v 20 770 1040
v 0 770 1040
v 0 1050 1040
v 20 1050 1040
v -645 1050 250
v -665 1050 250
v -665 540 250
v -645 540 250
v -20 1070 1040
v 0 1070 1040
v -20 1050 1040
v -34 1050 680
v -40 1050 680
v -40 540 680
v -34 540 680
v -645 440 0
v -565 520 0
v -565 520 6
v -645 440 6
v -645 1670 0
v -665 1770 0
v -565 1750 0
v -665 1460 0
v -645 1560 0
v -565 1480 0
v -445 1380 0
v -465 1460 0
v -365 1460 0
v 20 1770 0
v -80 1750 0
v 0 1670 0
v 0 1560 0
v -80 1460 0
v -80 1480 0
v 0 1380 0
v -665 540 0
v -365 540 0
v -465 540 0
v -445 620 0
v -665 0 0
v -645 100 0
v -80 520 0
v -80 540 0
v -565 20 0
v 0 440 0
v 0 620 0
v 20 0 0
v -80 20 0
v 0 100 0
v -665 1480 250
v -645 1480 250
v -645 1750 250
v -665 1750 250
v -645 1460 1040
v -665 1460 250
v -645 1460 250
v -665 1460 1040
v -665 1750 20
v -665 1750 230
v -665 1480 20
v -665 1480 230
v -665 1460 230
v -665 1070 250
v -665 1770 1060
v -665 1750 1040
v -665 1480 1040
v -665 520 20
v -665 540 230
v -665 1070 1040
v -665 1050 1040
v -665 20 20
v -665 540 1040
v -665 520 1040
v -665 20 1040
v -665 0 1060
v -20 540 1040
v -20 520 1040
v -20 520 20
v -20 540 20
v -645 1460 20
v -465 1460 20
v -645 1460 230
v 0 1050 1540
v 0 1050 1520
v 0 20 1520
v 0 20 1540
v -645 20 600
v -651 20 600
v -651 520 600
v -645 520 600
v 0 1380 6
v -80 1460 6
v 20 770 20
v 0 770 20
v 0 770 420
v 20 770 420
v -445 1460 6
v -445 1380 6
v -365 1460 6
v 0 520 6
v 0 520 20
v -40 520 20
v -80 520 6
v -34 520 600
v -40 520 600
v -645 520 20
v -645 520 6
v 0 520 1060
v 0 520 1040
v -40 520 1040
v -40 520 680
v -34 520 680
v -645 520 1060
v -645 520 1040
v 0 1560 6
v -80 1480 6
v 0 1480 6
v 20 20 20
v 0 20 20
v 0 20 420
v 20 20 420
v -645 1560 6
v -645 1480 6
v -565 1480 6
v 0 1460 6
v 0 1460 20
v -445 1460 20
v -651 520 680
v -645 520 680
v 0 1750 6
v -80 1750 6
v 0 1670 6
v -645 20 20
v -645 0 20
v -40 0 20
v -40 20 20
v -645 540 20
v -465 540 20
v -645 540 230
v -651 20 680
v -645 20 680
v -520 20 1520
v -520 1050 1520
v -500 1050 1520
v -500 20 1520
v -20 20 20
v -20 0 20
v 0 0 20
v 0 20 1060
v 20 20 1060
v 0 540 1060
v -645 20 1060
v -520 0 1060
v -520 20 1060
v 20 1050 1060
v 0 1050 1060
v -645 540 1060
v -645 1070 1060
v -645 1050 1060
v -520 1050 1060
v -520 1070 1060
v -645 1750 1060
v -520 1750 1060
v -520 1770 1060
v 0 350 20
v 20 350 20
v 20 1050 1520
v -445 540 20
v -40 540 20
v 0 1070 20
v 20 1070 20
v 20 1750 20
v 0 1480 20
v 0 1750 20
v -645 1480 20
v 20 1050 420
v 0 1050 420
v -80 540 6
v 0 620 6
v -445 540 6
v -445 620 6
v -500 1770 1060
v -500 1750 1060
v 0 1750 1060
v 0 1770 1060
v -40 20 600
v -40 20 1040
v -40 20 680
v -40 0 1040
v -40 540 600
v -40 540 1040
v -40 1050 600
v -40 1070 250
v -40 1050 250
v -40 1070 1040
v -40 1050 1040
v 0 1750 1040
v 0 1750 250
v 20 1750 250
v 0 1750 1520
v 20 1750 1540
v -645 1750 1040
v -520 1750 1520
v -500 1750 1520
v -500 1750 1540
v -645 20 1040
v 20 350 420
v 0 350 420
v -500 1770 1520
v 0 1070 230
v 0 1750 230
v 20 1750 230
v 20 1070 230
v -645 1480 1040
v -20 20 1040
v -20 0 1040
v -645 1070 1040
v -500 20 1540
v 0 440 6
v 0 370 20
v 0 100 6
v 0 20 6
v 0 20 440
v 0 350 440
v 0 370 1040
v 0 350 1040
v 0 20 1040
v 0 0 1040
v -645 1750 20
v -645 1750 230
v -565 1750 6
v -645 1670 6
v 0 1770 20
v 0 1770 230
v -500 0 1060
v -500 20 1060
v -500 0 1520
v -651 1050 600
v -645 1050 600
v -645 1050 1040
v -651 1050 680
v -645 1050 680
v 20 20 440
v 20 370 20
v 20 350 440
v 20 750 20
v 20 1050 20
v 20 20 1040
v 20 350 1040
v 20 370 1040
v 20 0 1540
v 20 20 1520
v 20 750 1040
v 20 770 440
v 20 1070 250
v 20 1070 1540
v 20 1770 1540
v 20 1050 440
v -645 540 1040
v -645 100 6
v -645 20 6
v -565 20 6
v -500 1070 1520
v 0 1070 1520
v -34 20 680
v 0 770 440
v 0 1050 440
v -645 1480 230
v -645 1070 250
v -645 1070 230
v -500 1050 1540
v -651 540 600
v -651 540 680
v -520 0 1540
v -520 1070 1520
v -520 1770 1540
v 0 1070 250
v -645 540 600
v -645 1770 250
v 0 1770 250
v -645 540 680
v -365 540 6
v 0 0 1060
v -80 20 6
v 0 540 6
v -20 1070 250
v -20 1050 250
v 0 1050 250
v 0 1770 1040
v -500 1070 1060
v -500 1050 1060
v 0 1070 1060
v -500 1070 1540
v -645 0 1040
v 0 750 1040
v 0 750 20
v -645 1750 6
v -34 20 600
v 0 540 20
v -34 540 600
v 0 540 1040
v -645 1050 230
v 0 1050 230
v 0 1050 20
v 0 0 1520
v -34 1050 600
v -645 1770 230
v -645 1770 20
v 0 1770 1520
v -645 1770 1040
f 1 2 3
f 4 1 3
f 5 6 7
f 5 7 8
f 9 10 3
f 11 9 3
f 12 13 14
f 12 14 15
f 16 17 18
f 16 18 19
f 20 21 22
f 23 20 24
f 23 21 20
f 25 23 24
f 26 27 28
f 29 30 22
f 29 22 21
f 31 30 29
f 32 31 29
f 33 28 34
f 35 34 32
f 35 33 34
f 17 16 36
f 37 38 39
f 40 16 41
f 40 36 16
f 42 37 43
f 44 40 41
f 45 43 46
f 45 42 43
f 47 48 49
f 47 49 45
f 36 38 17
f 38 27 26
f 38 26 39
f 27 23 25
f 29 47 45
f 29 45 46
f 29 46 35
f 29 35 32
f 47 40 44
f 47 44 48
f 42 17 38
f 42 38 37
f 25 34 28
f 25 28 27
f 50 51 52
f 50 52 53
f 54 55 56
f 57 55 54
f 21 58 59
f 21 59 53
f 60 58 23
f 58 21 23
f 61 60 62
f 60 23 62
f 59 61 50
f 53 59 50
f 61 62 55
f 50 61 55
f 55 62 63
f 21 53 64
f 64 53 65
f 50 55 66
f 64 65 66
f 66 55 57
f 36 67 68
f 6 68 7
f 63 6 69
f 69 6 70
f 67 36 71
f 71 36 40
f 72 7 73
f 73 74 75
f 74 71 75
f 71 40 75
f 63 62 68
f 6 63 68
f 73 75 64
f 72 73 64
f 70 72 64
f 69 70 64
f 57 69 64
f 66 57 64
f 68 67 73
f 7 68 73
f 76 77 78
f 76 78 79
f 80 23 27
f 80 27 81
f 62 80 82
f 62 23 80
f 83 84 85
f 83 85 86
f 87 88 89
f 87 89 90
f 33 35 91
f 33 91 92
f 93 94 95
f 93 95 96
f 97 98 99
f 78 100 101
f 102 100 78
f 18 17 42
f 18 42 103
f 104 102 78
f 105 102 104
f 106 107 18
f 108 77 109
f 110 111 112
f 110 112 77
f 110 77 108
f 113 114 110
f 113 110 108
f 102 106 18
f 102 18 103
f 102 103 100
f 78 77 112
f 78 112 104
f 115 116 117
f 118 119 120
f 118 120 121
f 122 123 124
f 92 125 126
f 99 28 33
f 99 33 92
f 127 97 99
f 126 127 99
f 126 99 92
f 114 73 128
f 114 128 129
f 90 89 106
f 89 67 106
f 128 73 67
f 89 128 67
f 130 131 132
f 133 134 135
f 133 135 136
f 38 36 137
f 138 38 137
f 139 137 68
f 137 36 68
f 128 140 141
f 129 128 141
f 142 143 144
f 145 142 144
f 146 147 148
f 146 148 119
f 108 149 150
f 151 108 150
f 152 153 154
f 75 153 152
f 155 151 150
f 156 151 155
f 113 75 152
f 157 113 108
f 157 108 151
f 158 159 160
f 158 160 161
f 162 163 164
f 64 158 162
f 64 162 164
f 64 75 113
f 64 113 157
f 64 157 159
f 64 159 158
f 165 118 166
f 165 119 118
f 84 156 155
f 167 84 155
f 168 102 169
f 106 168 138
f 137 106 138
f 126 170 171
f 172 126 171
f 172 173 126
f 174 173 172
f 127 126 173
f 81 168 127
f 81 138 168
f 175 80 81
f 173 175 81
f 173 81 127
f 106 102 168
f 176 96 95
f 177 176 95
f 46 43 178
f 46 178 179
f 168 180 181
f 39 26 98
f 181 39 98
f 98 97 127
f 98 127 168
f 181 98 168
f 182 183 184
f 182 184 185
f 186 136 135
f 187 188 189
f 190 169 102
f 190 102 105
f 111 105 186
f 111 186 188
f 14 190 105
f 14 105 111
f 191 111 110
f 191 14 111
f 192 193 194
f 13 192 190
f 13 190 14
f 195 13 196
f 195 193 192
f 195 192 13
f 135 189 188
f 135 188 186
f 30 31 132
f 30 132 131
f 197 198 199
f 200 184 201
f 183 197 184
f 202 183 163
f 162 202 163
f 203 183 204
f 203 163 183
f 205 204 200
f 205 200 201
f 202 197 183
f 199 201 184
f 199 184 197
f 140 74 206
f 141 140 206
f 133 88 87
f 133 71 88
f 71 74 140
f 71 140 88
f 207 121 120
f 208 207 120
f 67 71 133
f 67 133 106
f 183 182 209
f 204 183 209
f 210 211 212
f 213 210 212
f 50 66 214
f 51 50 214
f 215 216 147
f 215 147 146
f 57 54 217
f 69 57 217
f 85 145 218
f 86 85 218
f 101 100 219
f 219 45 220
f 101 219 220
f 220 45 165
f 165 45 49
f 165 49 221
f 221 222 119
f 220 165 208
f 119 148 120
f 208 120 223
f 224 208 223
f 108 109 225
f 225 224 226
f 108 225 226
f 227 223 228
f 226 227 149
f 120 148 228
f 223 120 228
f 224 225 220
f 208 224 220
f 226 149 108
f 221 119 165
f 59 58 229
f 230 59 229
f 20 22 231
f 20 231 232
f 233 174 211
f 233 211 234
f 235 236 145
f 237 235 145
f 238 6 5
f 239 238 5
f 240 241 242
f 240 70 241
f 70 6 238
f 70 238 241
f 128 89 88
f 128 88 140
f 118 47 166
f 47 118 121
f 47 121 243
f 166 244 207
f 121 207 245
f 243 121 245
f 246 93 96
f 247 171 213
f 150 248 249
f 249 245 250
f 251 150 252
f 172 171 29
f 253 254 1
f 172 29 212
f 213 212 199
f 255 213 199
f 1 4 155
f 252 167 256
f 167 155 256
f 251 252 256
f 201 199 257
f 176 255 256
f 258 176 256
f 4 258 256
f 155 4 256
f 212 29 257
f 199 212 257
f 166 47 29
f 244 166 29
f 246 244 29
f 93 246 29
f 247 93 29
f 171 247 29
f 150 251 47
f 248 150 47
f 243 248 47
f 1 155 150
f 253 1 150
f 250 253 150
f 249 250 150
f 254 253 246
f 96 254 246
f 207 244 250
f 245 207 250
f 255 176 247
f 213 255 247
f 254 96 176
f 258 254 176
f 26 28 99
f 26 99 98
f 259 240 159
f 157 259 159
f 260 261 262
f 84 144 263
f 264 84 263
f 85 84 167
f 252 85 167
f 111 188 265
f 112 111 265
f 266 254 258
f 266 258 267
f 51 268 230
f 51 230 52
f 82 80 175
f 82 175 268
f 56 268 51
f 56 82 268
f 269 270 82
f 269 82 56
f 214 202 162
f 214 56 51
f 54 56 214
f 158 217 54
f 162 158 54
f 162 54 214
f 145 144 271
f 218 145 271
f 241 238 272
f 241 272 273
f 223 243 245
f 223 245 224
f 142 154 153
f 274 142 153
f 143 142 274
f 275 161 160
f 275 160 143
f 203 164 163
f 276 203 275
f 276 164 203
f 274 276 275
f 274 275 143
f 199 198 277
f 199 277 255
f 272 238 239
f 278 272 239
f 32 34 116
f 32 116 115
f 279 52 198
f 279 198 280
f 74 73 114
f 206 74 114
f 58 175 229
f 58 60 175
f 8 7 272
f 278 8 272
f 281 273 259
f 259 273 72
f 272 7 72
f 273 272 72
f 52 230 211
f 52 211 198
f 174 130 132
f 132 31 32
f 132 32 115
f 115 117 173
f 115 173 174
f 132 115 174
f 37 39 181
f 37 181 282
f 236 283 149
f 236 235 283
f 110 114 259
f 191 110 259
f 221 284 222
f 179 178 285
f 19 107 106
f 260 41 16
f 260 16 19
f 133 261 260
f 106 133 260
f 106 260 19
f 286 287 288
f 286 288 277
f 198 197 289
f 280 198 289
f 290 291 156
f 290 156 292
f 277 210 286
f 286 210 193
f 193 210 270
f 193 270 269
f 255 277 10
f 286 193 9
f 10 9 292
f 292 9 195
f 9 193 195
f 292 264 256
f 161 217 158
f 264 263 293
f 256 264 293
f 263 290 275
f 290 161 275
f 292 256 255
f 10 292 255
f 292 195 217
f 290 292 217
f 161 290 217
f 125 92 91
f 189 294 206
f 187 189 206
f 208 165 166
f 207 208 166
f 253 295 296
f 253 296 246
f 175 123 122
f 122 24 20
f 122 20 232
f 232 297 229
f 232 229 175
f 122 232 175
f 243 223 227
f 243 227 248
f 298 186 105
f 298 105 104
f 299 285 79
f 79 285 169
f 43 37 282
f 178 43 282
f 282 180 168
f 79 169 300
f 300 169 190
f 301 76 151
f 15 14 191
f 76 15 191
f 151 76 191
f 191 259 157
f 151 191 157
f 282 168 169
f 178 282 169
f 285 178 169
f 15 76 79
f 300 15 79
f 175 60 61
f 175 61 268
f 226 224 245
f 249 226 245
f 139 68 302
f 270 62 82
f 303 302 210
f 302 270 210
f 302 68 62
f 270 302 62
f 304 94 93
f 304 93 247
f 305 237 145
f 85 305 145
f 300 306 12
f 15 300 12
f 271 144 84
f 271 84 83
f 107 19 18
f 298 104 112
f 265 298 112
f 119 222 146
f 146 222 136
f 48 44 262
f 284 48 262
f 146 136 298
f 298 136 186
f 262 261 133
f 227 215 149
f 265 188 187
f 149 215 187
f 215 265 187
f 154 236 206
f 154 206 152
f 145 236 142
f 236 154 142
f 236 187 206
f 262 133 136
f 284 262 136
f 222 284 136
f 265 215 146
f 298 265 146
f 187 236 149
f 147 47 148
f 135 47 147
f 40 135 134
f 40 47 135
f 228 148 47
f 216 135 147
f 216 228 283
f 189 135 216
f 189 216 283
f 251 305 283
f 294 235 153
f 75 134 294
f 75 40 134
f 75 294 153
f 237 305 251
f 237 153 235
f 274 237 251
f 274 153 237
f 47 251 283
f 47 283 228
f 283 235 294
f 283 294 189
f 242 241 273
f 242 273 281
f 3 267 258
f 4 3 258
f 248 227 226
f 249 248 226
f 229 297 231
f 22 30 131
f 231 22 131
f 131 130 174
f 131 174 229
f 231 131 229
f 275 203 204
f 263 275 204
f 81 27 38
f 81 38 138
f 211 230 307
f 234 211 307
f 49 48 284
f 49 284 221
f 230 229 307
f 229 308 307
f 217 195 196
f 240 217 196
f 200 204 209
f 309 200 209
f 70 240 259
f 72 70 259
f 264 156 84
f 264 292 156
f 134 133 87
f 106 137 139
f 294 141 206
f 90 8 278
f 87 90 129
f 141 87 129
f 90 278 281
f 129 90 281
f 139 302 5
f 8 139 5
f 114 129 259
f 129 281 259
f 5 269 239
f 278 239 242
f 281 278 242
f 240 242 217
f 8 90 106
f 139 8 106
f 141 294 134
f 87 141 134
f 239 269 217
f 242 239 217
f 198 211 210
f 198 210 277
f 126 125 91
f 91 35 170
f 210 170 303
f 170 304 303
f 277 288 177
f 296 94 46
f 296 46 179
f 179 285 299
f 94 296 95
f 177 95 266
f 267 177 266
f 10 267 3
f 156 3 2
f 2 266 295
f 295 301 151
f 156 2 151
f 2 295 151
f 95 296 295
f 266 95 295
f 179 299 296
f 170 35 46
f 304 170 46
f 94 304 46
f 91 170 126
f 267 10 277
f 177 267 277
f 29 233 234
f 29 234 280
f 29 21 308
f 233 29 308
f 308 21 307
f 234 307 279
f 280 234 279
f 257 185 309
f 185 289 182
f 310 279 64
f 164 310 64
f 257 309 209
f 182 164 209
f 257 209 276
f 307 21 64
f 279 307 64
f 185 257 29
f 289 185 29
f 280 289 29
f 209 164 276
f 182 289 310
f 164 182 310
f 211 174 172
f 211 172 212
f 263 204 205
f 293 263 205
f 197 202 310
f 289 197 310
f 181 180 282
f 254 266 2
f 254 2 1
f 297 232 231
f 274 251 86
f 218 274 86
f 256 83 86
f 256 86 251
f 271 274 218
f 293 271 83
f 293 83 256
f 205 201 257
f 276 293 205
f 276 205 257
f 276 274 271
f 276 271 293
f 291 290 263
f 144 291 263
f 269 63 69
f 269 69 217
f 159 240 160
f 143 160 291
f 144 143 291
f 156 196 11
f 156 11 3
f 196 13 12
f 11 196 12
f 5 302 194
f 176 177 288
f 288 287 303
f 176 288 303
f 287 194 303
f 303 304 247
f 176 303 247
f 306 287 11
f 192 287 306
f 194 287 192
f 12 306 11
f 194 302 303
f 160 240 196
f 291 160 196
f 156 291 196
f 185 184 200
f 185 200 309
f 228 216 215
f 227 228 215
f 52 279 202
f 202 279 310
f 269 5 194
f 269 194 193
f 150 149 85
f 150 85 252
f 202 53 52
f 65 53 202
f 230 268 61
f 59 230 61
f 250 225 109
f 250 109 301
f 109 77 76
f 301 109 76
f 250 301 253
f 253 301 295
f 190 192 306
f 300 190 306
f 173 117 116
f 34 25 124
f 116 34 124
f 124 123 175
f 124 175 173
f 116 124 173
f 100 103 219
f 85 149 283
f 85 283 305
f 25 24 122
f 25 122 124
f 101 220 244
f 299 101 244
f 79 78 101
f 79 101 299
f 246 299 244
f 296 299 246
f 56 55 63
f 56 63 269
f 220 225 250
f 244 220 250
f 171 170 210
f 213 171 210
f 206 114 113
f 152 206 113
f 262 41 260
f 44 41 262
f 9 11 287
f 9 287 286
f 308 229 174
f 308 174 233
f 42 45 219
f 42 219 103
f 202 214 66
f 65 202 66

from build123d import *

# Parameters (mm, degrees)
F0_W      = 20
F0_H      = 20
F1_DEPTH  = 1770
F2_W      = 20
F2_H      = 20
F3_DEPTH  = 665
F4_W      = 20
F4_H      = 20
F5_DEPTH  = 520
F6_W      = 20
F6_H      = 20
F7_DEPTH  = 290
F8_W      = 20
F8_H      = 20
F9_DEPTH  = 645
F10_W     = 20
F10_H     = 20
F11_DEPTH = 645
F12_W     = 20
F12_H     = 20
F13_DEPTH = 920
F14_W     = 20
F14_H     = 20
F15_DEPTH = 1040
F16_W     = 20
F16_H     = 20
F17_DEPTH = 920
F18_W     = 20
F18_H     = 20
F19_DEPTH = 1030
F20_W     = 20
F20_H     = 20
F21_DEPTH = 920
F22_W     = 20
F22_H     = 20
F23_DEPTH = 645
F24_W     = 20
F24_H     = 20
F25_DEPTH = 790
F26_W     = 20
F26_H     = 20
F27_DEPTH = 500
F28_W     = 20
F28_H     = 20
F29_DEPTH = 645
F30_W     = 20
F30_H     = 20
F31_DEPTH = 270
F32_W     = 20
F32_H     = 20
F33_DEPTH = 645
F34_W     = 20
F34_H     = 20
F35_DEPTH = 680
F36_W     = 20
F36_H     = 20
F37_DEPTH = 645
F38_W     = 20
F38_H     = 20
F39_DEPTH = 270
F40_W     = 20
F40_H     = 20
F41_DEPTH = 1020
F43_W     = 20
F43_H     = 20
F44_DEPTH = 645
F42_W     = 20
F42_H     = 20
F45_DEPTH = 1020
F46_W     = 20
F46_H     = 20
F47_DEPTH = 790
F48_W     = 6
F48_H     = 80
F49_DEPTH = 1030
F50_W     = 6
F50_H     = 80
F51_DEPTH = 1030
F52_W     = 20
F52_H     = 20
F53_DEPTH = 480
F54_W     = 20
F54_H     = 20
F55_DEPTH = 1750
F56_W     = 20
F56_H     = 20
F57_DEPTH = 1030
F58_W     = 20
F58_H     = 20
F59_DEPTH = 500
F61_DEPTH = 6
F62_W     = 20
F62_H     = 20
F63_DEPTH = 1020
F64_W     = 20
F64_H     = 20
F65_DEPTH = 280
F66_W     = 20
F66_H     = 20
F67_DEPTH = 330


with BuildPart() as f1:
    # F0 (on Front) → F1 (new body)
    with BuildSketch(Plane.XZ):
        with Locations((10, 10)):
            Rectangle(F0_W, F0_H)
    extrude(amount=-F1_DEPTH)

    # F2 (on face) → F3 (join)
    with BuildSketch(Plane(origin=(0, 0, 0), x_dir=(0, -1, 0), z_dir=(-1, 0, 0))):
        with Locations((-10, 10)):
            Rectangle(F2_W, F2_H)
        with Locations((-1760, 10)):
            Rectangle(F2_W, F2_H)
    extrude(amount=F3_DEPTH)

    # F4 (on face) → F5 (join)
    with BuildSketch(Plane(origin=(0, 20, 0), x_dir=(-1, 0, 0), z_dir=(0, 1, 0))):
        with Locations((655, 10)):
            Rectangle(F4_W, F4_H)
    extrude(amount=F5_DEPTH)

    # F6 (on face) → F7 (join)
    with BuildSketch(Plane.XZ.offset(-1750)):
        with Locations((-655, 10)):
            Rectangle(F6_W, F6_H)
    extrude(amount=F7_DEPTH)

    # F8 (on face) → F9 (join, through all)
    with BuildSketch(Plane.YZ.offset(-645)):
        with Locations((530, 10)):
            Rectangle(F8_W, F8_H)
    extrude(amount=F9_DEPTH)

    # F10 (on face) → F11 (join, through all)
    with BuildSketch(Plane.YZ.offset(-645)):
        with Locations((1470, 10)):
            Rectangle(F10_W, F10_H)
    extrude(amount=F11_DEPTH)

    # F12 (on face) → F13 (join, through all)
    with BuildSketch(Plane.XZ.offset(-1460)):
        with Locations((-455, 10)):
            Rectangle(F12_W, F12_H)
    extrude(amount=F13_DEPTH)

    # F14 (on face) → F15 (join)
    with BuildSketch(Plane.XY.offset(20)):
        with Locations((10, 10)):
            Rectangle(F14_W, F14_H)
        with Locations((-655, 10)):
            Rectangle(F14_W, F14_H)
        with Locations((-655, 530)):
            Rectangle(F14_W, F14_H)
        with Locations((10, 1760)):
            Rectangle(F14_W, F14_H)
        with Locations((-655, 1470)):
            Rectangle(F14_W, F14_H)
        with Locations((-655, 1760)):
            Rectangle(F14_W, F14_H)
        with Locations((10, 1060)):
            Rectangle(F14_W, F14_H)
    extrude(amount=F15_DEPTH)

    # F16 (on face) → F17 (join, through all)
    with BuildSketch(Plane.XZ.offset(-1460)):
        with Locations((-655, 240)):
            Rectangle(F16_W, F16_H)
    extrude(amount=F17_DEPTH)

    # F18 (on face) → F19 (join, through all)
    with BuildSketch(Plane(origin=(0, 20, 0), x_dir=(-1, 0, 0), z_dir=(0, 1, 0))):
        with Locations((-10, 1050)):
            Rectangle(F18_W, F18_H)
    extrude(amount=F19_DEPTH)

    # F20 (on face) → F21 (join, through all)
    with BuildSketch(Plane(origin=(0, 540, 0), x_dir=(-1, 0, 0), z_dir=(0, 1, 0))):
        with Locations((655, 1050)):
            Rectangle(F20_W, F20_H)
    extrude(amount=F21_DEPTH)

    # F22 (on face) → F23 (join, through all)
    with BuildSketch(Plane(origin=(0, 0, 0), x_dir=(0, -1, 0), z_dir=(-1, 0, 0))):
        with Locations((-1060, 1050)):
            Rectangle(F22_W, F22_H)
    extrude(amount=F23_DEPTH)

    # F24 (on face) → F25 (join, through all)
    with BuildSketch(Plane(origin=(0, 0, 1040), x_dir=(1, 0, 0), z_dir=(0, 0, -1))):
        with Locations((-655, -1060)):
            Rectangle(F24_W, F24_H)
    extrude(amount=F25_DEPTH)

    # F26 (on face) → F27 (join, through all)
    with BuildSketch(Plane.XZ.offset(-520)):
        with Locations((-655, 1050)):
            Rectangle(F26_W, F26_H)
    extrude(amount=F27_DEPTH)

    # F28 (on face) → F29 (join, through all)
    with BuildSketch(Plane.YZ.offset(-645)):
        with Locations((10, 1050)):
            Rectangle(F28_W, F28_H)
    extrude(amount=F29_DEPTH)

    # F30 (on face) → F31 (join, through all)
    with BuildSketch(Plane(origin=(0, 1480, 0), x_dir=(-1, 0, 0), z_dir=(0, 1, 0))):
        with Locations((655, 240)):
            Rectangle(F30_W, F30_H)
    extrude(amount=F31_DEPTH)

    # F32 (on face) → F33 (join, through all)
    with BuildSketch(Plane.YZ.offset(-645)):
        with Locations((1760, 240)):
            Rectangle(F32_W, F32_H)
        with Locations((1060, 240)):
            Rectangle(F32_W, F32_H)
    extrude(amount=F33_DEPTH)

    # F34 (on face) → F35 (join, through all)
    with BuildSketch(Plane.XZ.offset(-1750)):
        with Locations((10, 240)):
            Rectangle(F34_W, F34_H)
    extrude(amount=F35_DEPTH)

    # F36 (on face) → F37 (join, through all)
    with BuildSketch(Plane.YZ.offset(-645)):
        with Locations((1760, 1050)):
            Rectangle(F36_W, F36_H)
    extrude(amount=F37_DEPTH)

    # F38 (on face) → F39 (join, through all)
    with BuildSketch(Plane(origin=(0, 1480, 0), x_dir=(-1, 0, 0), z_dir=(0, 1, 0))):
        with Locations((655, 1050)):
            Rectangle(F38_W, F38_H)
    extrude(amount=F39_DEPTH)

    # F40 (on face) → F41 (join, through all)
    with BuildSketch(Plane.XY.offset(20)):
        with Locations((-30, 10)):
            Rectangle(F40_W, F40_H)
    extrude(amount=F41_DEPTH)

    # F43 (on face) → F44 (join, through all)
    with BuildSketch(Plane.YZ.offset(-645)):
        with Locations((530, 1050)):
            Rectangle(F43_W, F43_H)
    extrude(amount=F44_DEPTH)

    # F42 (on face) → F45 (join, through all)
    with BuildSketch(Plane.XY.offset(20)):
        with Locations((-30, 530)):
            Rectangle(F42_W, F42_H)
    extrude(amount=F45_DEPTH)

    # F46 (on face) → F47 (join, through all)
    with BuildSketch(Plane.XY.offset(250)):
        with Locations((-30, 1060)):
            Rectangle(F46_W, F46_H)
    extrude(amount=F47_DEPTH)

    # F48 (on face) → F49 (join, through all)
    with BuildSketch(Plane.XZ.offset(-1050)):
        with Locations((-648, 640)):
            Rectangle(F48_W, F48_H)
    extrude(amount=F49_DEPTH)

    # F50 (on face) → F51 (join, through all)
    with BuildSketch(Plane.XZ.offset(-1050)):
        with Locations((-37, 640)):
            Rectangle(F50_W, F50_H)
    extrude(amount=F51_DEPTH)

    # F52 (on face) → F53 (join)
    with BuildSketch(Plane.XY.offset(1060)):
        with Locations((10, 10)):
            Rectangle(F52_W, F52_H)
        with Locations((10, 1060)):
            Rectangle(F52_W, F52_H)
        with Locations((10, 1760)):
            Rectangle(F52_W, F52_H)
        with Locations((-510, 10)):
            Rectangle(F52_W, F52_H)
        with Locations((-510, 1060)):
            Rectangle(F52_W, F52_H)
        with Locations((-510, 1760)):
            Rectangle(F52_W, F52_H)
    extrude(amount=F53_DEPTH)

    # F54 (on face) → F55 (join, through all)
    with BuildSketch(Plane.XZ.offset(-1750)):
        with Locations((-510, 1530)):
            Rectangle(F54_W, F54_H)
    extrude(amount=F55_DEPTH)

    # F56 (on face) → F57 (join, through all)
    with BuildSketch(Plane.XZ.offset(-1050)):
        with Locations((10, 1530)):
            Rectangle(F56_W, F56_H)
    extrude(amount=F57_DEPTH)

    # F58 (on face) → F59 (join, through all)
    with BuildSketch(Plane.YZ.offset(-500)):
        with Locations((10, 1530)):
            Rectangle(F58_W, F58_H)
        with Locations((1060, 1530)):
            Rectangle(F58_W, F58_H)
        with Locations((1760, 1530)):
            Rectangle(F58_W, F58_H)
    extrude(amount=F59_DEPTH)

    # F60 (on face) → F61 (join)
    with BuildSketch(Plane(origin=(0, 0, 0), x_dir=(1, 0, 0), z_dir=(0, 0, -1))):
        Polygon((-645, -100), (-565, -20), (-645, -20), align=None)
        Polygon((0, -100), (0, -20), (-80, -20), align=None)
        Polygon((-645, -440), (-645, -520), (-565, -520), align=None)
        Polygon((0, -520), (0, -440), (-80, -520), align=None)
        Polygon((0, -540), (-80, -540), (0, -620), align=None)
        Polygon((-445, -620), (-365, -540), (-445, -540), align=None)
        Polygon((-80, -1460), (0, -1460), (0, -1380), align=None)
        Polygon((-445, -1380), (-445, -1460), (-365, -1460), align=None)
        Polygon((0, -1560), (0, -1480), (-80, -1480), align=None)
        Polygon((-80, -1750), (0, -1750), (0, -1670), align=None)
        Polygon((-645, -1670), (-645, -1750), (-565, -1750), align=None)
        Polygon((-645, -1480), (-645, -1560), (-565, -1480), align=None)
    extrude(amount=-F61_DEPTH)

    # F62 (on face) → F63 (join, through all)
    with BuildSketch(Plane.XY.offset(20)):
        with Locations((10, 360)):
            Rectangle(F62_W, F62_H)
        with Locations((10, 760)):
            Rectangle(F62_W, F62_H)
    extrude(amount=F63_DEPTH)

    # F64 (on face) → F65 (join, through all)
    with BuildSketch(Plane(origin=(0, 770, 0), x_dir=(-1, 0, 0), z_dir=(0, 1, 0))):
        with Locations((-10, 430)):
            Rectangle(F64_W, F64_H)
    extrude(amount=F65_DEPTH)

    # F66 (on face) → F67 (join, through all)
    with BuildSketch(Plane(origin=(0, 20, 0), x_dir=(-1, 0, 0), z_dir=(0, 1, 0))):
        with Locations((-10, 430)):
            Rectangle(F66_W, F66_H)
    extrude(amount=F67_DEPTH)


solid = f1.part
